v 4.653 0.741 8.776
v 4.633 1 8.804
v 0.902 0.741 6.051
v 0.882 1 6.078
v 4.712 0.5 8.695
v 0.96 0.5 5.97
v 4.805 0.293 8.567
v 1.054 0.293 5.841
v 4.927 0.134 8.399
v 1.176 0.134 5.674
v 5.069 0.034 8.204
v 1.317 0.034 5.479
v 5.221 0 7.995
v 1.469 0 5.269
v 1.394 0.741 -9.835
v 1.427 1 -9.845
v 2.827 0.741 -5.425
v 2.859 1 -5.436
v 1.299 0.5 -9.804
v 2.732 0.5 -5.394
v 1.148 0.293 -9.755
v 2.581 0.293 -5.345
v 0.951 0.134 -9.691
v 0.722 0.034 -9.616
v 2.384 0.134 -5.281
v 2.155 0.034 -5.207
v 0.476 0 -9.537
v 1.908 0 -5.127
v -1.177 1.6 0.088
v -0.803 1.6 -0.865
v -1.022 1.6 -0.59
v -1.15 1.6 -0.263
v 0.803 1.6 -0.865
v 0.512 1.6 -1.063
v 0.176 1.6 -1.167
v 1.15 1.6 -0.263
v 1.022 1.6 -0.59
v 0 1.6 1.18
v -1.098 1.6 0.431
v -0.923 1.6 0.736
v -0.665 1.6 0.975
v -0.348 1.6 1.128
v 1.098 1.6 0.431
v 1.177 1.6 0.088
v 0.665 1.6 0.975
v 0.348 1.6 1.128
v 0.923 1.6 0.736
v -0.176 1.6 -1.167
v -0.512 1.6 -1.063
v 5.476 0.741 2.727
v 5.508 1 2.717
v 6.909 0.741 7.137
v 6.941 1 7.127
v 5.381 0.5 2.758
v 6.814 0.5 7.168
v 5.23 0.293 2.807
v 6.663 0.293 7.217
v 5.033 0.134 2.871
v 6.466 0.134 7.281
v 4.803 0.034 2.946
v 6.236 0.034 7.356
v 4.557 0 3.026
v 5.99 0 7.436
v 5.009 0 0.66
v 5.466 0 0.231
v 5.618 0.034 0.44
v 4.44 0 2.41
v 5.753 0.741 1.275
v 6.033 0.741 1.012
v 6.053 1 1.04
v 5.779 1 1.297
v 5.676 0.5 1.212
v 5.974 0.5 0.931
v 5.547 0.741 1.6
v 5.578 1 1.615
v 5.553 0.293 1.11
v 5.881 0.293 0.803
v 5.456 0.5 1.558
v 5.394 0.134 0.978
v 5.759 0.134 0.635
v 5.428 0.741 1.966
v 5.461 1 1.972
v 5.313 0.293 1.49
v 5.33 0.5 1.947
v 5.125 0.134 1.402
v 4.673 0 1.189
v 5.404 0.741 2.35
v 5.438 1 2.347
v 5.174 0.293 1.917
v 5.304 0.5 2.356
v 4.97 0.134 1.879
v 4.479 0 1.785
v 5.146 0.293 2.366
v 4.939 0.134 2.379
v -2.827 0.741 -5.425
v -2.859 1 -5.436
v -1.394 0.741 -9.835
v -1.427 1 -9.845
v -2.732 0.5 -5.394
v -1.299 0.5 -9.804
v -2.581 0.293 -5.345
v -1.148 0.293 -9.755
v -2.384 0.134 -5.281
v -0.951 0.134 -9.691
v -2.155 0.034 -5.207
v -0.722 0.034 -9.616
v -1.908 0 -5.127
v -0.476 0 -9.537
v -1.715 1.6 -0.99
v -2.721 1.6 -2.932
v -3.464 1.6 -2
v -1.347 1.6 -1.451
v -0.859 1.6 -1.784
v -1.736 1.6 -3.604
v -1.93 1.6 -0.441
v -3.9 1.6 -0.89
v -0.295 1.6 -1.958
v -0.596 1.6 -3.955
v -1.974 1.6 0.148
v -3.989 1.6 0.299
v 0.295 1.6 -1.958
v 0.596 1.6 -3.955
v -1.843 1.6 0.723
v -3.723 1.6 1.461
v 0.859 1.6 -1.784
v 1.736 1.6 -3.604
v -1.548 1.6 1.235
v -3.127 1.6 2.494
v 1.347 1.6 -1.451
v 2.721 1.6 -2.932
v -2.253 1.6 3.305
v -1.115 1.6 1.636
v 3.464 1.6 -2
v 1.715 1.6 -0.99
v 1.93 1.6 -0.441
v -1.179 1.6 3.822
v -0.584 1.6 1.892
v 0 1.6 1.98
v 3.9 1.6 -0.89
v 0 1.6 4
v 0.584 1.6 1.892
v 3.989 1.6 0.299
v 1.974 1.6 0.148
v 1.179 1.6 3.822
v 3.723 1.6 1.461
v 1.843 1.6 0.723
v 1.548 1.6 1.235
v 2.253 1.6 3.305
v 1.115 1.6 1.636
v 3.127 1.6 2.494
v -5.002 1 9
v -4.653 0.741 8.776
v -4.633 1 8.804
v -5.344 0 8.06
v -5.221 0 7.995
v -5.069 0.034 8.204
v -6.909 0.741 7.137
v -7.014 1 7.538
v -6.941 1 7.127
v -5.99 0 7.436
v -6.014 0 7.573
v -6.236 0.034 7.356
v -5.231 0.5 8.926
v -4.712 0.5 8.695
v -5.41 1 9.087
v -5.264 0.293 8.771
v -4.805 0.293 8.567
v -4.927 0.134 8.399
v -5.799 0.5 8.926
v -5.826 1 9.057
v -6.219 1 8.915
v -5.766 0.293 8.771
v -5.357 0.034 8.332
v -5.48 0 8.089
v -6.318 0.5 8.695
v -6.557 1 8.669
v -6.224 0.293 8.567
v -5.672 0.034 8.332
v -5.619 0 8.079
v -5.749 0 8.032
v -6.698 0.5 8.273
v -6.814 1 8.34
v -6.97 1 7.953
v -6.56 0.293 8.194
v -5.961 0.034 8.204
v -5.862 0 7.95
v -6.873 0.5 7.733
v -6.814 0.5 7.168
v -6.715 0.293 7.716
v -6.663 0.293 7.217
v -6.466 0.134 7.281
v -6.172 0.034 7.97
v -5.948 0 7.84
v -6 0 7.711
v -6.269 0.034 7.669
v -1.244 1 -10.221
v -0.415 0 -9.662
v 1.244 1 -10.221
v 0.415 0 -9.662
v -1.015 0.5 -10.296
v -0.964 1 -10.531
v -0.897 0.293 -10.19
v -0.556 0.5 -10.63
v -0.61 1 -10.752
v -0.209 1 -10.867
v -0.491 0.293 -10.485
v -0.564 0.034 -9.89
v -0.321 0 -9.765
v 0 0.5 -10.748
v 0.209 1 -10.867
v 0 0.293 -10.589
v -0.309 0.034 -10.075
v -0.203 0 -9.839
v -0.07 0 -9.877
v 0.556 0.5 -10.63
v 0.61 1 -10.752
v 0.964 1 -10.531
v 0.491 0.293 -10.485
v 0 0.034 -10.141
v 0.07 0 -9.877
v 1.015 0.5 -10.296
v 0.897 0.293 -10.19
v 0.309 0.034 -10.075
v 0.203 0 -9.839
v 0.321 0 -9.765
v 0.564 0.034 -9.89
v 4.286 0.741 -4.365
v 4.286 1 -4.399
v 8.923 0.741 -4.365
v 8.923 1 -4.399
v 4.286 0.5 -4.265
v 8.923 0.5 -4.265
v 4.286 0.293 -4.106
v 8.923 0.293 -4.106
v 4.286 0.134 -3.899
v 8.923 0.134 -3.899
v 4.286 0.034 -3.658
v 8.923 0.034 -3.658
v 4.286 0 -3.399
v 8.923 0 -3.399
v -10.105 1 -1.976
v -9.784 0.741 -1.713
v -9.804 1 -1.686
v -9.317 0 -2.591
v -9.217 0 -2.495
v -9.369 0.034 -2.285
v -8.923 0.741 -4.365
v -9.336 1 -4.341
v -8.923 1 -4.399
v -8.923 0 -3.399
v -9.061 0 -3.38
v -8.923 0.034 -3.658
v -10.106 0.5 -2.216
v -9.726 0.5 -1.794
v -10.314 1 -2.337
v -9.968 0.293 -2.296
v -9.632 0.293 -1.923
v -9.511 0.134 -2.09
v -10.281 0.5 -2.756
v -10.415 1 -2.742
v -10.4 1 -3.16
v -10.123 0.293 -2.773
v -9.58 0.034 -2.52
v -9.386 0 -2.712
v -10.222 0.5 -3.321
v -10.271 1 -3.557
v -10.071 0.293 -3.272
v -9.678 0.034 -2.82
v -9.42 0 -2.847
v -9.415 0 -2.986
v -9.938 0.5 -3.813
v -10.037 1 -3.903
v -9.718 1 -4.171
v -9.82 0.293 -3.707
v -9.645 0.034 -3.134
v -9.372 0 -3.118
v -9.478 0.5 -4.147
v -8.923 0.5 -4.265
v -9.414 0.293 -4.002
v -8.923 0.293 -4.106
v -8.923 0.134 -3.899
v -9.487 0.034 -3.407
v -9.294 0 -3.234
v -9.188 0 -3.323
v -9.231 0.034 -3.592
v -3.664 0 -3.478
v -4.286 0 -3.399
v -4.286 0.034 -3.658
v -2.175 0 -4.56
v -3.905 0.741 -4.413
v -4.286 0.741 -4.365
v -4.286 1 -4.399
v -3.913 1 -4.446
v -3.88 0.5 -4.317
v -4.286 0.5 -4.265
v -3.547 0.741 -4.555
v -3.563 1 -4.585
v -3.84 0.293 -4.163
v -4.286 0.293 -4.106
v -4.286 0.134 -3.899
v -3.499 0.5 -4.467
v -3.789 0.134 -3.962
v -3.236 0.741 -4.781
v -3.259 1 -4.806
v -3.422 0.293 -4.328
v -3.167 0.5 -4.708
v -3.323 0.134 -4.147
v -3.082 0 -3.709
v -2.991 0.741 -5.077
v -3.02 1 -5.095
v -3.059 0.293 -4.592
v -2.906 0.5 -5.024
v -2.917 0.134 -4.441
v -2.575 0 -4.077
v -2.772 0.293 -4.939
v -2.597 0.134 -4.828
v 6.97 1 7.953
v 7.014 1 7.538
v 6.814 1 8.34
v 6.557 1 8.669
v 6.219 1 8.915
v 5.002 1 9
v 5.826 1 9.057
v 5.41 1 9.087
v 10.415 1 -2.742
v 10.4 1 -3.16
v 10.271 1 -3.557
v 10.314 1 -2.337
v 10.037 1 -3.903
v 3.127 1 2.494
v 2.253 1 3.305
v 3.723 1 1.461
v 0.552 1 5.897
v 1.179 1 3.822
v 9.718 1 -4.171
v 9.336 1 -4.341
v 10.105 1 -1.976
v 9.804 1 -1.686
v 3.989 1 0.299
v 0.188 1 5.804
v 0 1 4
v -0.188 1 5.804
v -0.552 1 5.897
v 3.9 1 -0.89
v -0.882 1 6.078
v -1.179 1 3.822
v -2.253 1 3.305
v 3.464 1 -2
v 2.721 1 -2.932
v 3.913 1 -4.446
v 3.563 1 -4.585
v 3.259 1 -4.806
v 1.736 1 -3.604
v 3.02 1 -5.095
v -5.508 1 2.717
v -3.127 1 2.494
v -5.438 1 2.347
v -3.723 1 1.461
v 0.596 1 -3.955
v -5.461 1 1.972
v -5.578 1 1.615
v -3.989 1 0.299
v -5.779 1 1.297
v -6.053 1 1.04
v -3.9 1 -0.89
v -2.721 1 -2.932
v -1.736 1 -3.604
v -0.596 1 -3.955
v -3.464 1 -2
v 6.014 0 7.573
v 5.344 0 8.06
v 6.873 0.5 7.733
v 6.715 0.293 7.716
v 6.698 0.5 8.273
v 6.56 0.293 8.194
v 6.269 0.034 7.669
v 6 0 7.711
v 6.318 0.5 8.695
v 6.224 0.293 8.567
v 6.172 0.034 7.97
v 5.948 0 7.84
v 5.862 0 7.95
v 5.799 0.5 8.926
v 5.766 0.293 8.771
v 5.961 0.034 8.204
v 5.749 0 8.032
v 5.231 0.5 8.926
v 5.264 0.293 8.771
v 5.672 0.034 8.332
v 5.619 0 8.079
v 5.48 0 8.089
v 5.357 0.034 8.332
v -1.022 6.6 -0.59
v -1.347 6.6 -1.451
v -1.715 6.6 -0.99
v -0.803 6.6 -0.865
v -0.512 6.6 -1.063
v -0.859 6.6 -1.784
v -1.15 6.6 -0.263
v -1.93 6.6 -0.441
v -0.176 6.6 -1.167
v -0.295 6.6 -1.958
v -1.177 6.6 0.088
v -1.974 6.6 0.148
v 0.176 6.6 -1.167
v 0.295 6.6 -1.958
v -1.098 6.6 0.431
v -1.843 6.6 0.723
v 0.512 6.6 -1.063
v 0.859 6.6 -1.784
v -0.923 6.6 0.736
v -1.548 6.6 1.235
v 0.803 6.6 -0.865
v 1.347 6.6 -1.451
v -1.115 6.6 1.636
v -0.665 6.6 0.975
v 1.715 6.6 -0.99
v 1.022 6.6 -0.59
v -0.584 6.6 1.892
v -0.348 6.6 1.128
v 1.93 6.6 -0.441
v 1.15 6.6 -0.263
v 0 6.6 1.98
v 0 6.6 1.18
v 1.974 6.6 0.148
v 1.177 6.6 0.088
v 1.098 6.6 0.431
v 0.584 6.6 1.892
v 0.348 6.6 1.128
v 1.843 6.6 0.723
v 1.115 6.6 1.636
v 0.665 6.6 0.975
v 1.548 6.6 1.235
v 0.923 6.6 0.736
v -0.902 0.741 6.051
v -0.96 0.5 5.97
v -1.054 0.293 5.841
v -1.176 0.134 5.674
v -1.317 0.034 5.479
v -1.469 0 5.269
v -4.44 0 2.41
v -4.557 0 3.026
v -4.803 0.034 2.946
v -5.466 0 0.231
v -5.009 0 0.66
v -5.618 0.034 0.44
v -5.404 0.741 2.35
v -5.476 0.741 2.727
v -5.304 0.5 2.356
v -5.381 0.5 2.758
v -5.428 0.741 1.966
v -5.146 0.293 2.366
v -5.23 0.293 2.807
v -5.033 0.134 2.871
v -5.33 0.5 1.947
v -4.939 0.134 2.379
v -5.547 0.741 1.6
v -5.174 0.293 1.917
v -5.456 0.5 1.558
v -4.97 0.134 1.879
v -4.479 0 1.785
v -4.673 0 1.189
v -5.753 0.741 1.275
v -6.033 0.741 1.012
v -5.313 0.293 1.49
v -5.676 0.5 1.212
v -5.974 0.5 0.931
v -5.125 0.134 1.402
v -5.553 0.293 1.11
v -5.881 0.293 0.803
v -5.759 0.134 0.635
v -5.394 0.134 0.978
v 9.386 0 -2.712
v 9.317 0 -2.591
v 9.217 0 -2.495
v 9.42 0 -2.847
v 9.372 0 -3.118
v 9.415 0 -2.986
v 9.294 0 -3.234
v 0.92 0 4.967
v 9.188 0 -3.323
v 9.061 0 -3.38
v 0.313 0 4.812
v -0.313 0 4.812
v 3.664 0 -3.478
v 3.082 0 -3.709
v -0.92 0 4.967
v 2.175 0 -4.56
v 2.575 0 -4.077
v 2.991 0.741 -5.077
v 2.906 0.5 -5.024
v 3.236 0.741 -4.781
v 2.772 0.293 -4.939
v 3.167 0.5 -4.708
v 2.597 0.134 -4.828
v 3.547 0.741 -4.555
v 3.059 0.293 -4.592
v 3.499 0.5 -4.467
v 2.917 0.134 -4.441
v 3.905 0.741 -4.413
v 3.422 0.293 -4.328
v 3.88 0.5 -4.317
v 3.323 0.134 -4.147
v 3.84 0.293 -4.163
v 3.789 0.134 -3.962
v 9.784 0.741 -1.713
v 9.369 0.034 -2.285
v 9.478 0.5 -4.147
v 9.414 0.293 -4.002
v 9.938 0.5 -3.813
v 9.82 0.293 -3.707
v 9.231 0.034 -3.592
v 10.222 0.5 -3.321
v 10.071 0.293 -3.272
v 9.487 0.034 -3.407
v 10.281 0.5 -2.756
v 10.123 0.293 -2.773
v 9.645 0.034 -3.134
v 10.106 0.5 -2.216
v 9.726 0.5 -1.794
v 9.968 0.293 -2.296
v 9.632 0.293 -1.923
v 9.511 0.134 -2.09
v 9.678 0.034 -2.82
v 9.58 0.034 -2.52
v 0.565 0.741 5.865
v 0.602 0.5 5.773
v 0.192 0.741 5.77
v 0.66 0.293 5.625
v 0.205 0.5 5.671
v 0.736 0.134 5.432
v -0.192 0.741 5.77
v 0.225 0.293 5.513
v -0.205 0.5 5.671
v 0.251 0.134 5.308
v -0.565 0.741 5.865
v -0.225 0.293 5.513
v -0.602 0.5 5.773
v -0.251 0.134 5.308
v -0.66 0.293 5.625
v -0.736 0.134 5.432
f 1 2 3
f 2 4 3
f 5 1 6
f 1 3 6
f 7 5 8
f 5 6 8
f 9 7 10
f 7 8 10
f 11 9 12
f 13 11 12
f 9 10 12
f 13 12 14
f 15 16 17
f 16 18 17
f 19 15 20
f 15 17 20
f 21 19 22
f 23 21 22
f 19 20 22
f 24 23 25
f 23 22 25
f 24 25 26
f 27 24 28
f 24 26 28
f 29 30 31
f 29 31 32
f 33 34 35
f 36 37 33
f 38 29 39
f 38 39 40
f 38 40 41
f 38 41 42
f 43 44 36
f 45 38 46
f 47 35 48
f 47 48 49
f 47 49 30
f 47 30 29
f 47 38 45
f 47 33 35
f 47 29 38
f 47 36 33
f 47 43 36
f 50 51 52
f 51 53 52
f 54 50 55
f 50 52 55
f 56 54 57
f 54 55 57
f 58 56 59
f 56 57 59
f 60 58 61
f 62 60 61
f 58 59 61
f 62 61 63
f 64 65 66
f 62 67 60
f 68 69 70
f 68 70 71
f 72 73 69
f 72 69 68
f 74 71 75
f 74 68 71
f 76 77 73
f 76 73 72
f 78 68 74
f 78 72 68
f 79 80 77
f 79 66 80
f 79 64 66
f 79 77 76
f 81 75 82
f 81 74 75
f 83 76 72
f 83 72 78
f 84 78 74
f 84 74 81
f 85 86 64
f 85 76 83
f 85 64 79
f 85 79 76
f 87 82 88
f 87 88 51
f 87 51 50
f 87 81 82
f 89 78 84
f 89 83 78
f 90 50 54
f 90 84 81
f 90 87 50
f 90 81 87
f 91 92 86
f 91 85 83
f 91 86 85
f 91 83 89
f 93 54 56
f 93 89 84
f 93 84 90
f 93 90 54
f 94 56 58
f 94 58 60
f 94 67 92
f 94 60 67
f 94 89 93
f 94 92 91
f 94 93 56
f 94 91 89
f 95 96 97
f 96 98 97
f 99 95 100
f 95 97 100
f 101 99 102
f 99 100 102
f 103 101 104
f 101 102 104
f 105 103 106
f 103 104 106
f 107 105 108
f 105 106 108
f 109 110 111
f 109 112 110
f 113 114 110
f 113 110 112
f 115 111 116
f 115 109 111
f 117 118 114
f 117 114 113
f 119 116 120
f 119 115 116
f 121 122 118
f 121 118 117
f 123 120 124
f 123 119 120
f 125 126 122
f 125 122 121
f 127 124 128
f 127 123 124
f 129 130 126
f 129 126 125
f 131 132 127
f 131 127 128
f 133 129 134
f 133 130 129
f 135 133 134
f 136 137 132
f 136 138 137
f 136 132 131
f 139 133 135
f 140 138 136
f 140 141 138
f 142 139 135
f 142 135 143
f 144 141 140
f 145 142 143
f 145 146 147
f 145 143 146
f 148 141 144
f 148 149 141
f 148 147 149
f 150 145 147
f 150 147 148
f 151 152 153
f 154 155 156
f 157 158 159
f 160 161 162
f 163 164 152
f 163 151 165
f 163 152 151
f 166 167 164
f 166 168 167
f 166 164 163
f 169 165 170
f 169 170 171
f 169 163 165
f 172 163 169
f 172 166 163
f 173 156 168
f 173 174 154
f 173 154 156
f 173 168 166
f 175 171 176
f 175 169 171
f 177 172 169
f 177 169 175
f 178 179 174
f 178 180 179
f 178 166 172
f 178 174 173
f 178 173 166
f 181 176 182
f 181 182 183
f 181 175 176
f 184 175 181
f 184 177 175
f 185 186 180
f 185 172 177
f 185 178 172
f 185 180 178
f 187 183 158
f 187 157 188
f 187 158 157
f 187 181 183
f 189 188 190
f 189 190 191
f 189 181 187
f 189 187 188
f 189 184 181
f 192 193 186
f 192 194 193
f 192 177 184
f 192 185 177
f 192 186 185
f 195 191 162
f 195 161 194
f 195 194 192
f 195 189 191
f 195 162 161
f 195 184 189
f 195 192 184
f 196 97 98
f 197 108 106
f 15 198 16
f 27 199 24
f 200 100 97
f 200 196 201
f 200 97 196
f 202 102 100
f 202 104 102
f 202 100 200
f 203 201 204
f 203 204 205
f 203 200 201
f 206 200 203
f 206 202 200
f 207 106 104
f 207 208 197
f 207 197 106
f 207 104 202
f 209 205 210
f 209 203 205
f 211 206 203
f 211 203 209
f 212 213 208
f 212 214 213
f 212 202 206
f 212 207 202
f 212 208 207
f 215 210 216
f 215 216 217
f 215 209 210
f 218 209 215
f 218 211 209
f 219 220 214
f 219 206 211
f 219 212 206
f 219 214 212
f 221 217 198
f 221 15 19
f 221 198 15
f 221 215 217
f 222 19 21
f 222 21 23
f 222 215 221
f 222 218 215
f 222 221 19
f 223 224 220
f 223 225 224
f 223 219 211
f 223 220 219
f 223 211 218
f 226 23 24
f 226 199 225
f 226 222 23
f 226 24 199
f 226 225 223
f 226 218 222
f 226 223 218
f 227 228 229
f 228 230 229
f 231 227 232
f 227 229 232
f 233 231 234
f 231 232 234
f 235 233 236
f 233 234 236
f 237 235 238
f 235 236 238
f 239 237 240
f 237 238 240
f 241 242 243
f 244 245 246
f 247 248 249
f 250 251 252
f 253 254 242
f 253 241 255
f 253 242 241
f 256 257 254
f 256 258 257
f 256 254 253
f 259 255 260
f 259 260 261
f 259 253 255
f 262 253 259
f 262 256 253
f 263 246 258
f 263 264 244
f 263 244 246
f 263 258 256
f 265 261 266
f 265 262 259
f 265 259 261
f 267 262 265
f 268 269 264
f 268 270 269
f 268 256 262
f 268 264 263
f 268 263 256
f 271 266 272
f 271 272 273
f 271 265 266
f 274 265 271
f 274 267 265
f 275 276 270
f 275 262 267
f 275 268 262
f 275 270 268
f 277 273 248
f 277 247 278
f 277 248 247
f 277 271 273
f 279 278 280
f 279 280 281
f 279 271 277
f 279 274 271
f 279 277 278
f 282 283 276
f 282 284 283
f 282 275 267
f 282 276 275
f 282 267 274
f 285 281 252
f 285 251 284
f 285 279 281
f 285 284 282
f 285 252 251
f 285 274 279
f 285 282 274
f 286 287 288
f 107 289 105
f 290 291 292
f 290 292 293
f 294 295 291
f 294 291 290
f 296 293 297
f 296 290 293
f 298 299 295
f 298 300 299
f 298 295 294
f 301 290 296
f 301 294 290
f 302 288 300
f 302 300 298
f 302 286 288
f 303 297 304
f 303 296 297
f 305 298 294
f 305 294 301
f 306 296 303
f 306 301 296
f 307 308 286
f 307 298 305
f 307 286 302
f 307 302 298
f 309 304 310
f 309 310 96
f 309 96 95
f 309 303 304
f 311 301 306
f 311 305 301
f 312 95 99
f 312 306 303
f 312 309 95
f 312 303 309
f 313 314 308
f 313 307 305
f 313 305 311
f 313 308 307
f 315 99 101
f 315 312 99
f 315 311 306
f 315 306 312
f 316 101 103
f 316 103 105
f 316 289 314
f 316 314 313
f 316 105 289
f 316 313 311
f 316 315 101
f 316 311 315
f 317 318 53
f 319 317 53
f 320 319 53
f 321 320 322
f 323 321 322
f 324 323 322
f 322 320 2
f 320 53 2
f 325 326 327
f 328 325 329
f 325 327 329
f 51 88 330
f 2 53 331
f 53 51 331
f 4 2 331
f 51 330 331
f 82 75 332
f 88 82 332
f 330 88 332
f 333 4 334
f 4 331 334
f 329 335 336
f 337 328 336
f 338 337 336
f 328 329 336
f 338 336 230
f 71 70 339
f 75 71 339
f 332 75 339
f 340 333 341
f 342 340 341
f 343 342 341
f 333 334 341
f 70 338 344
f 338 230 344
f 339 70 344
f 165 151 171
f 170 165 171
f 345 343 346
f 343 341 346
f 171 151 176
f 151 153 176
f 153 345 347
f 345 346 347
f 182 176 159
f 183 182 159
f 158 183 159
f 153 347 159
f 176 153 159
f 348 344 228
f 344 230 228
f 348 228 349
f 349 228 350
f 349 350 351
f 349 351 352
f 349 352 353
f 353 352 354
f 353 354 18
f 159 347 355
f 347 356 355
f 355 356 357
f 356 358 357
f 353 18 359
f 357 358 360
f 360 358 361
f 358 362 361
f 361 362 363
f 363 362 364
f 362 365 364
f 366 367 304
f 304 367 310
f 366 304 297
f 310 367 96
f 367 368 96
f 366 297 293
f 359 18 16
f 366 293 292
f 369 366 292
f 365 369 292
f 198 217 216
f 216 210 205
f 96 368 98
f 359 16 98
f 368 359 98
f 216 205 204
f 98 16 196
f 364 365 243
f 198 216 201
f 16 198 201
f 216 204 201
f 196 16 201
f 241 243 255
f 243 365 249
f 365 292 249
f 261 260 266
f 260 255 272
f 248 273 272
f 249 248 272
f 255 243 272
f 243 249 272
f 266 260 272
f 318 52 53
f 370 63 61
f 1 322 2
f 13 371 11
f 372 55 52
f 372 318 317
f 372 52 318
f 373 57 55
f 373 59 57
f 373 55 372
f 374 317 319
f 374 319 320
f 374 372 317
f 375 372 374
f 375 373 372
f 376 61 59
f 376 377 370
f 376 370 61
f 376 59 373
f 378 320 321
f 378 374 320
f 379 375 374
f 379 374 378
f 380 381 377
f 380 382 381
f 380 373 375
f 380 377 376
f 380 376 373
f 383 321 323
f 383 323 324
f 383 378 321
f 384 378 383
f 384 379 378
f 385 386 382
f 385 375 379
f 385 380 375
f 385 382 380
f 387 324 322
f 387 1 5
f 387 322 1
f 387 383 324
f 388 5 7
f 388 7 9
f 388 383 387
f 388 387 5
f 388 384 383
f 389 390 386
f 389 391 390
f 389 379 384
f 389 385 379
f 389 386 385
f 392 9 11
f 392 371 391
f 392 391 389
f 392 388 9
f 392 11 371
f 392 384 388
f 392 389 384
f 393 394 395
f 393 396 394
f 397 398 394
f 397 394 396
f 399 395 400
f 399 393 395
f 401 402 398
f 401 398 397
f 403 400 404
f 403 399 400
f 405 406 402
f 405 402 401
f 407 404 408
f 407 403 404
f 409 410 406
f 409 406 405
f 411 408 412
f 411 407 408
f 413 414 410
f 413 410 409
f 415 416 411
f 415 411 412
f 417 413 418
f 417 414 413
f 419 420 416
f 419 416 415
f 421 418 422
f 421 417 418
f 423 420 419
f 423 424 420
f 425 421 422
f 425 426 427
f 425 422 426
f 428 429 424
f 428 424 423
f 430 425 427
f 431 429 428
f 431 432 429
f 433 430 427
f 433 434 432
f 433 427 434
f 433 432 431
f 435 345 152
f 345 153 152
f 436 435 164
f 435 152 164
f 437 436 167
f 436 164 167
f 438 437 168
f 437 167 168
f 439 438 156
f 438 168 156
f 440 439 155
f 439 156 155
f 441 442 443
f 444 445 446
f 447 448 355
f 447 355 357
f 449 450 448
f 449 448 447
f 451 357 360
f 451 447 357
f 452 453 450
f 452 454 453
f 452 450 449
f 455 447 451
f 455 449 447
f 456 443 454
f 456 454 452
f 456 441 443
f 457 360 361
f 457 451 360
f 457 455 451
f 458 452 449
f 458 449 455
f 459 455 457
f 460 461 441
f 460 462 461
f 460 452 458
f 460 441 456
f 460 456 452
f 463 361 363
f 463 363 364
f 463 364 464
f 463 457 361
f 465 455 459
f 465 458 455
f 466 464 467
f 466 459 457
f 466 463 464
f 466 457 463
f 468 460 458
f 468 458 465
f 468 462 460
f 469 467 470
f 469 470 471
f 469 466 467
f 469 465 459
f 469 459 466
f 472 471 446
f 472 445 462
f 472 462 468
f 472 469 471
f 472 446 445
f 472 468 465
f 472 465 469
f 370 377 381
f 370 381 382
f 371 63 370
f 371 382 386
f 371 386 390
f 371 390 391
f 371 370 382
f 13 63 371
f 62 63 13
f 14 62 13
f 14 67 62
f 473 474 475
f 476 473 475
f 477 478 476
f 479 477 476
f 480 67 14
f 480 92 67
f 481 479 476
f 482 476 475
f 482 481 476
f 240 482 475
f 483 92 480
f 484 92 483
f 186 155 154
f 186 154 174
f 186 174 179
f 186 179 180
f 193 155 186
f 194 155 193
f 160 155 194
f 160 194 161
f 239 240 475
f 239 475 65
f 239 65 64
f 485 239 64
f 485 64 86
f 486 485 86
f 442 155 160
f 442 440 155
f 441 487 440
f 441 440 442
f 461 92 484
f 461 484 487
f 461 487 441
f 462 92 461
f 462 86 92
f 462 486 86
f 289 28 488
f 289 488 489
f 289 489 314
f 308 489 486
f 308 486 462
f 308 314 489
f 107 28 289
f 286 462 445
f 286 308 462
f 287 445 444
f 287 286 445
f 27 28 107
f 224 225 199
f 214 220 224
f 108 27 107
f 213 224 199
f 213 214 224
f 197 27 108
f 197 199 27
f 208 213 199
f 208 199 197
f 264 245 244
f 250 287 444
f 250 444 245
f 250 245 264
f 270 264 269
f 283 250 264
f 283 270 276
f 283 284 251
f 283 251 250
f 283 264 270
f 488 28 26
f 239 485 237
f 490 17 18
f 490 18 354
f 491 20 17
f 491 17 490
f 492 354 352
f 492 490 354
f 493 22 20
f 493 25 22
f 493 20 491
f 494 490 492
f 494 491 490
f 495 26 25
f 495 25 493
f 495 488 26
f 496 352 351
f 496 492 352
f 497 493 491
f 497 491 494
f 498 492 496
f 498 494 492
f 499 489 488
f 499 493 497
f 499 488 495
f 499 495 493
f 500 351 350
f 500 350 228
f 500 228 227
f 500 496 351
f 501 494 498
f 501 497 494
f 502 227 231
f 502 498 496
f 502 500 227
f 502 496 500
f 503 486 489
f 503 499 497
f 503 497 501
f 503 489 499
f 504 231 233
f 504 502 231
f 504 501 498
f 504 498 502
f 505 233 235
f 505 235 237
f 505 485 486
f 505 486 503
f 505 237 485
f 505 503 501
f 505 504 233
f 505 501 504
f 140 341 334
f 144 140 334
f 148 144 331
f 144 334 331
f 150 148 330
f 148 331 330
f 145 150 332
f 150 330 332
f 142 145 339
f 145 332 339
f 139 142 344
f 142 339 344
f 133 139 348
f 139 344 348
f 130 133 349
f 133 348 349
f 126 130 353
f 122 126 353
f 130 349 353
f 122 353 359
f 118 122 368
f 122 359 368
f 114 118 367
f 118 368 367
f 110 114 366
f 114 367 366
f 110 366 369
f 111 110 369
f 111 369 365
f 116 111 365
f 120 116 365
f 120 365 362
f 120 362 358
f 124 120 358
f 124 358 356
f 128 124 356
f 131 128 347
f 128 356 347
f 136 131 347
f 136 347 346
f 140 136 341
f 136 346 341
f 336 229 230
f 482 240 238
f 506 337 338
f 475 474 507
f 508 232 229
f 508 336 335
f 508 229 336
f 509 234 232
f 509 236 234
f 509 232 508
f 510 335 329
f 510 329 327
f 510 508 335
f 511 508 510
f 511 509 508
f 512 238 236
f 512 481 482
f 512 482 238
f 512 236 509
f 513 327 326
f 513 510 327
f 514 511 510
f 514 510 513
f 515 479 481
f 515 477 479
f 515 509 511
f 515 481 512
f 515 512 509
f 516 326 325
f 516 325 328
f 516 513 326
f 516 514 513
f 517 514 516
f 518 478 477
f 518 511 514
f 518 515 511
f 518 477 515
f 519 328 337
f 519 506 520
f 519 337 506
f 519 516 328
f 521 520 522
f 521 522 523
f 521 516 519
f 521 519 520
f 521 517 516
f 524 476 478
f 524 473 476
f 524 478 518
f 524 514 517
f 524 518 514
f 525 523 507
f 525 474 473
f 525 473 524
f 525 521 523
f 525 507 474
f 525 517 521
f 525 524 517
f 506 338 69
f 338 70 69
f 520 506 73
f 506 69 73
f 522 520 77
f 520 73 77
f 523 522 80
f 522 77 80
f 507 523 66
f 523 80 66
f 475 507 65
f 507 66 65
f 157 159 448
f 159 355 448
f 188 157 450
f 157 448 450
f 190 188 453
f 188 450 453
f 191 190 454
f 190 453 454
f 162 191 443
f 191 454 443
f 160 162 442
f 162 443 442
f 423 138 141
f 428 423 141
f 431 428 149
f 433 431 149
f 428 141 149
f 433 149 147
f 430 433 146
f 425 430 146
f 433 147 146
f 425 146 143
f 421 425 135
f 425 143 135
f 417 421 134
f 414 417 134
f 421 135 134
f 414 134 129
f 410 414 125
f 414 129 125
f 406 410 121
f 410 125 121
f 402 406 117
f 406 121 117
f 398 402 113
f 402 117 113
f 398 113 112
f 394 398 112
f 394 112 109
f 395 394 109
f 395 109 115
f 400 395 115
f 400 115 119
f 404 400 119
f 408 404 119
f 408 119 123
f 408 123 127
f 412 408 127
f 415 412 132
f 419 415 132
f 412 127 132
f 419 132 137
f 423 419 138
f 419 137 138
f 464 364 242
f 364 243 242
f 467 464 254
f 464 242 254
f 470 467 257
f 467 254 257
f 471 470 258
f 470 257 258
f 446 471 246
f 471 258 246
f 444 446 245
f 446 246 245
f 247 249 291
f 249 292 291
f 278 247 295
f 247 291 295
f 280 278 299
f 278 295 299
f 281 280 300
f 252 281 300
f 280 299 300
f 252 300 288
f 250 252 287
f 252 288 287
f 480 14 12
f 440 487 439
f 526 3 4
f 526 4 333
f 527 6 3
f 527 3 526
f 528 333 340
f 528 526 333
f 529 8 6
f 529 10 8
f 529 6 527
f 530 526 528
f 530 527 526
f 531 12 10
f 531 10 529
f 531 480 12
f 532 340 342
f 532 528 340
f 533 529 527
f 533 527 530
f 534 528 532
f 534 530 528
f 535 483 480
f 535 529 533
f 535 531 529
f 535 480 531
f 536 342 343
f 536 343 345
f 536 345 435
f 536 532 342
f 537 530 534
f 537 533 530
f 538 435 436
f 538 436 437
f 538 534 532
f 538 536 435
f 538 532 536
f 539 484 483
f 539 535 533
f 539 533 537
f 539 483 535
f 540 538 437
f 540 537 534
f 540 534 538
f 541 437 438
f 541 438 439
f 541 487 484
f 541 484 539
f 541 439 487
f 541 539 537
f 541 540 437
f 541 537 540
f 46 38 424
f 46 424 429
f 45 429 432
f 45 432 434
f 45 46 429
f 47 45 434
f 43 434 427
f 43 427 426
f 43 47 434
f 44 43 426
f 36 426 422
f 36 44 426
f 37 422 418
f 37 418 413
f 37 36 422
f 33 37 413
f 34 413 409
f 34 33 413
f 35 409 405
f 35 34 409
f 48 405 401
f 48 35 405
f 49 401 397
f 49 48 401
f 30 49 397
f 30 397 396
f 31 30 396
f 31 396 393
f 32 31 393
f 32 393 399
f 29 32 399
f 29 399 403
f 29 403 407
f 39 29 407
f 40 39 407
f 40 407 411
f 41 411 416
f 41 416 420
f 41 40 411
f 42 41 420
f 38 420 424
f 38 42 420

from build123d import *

# Parameters (mm, degrees)
SALIENTE_EXTRUIR1_DEPTH = 1
REDONDEO1_R             = 1
CROQUIS5_R              = 4
SALIENTE_EXTRUIR5_DEPTH = 0.6
CROQUIS2_R              = 1.98
CROQUIS2_R_2            = 1.18
SALIENTE_EXTRUIR2_DEPTH = 5


with BuildPart() as part:
    # Croquis1 → Saliente-Extruir1 (new body)
    with BuildSketch(Plane(origin=(0, 0, 0), x_dir=(1, 0, 0), z_dir=(0, 1, 0))):
        with BuildLine():
            Line((1.426584774, 9.845491503), (2.859425417, 5.435661447))
            ThreePointArc((2.859425417, 5.435661447), (3.404332313, 4.685661447), (4.286010191, 4.399186938))
            Line((4.286010191, 4.399186938), (8.922779911, 4.399186938))
            ThreePointArc((8.922779911, 4.399186938), (10.349364685, 3.36271243), (9.804457789, 1.685661447))
            Line((9.804457789, 1.685661447), (6.053232287, -1.039763413))
            ThreePointArc((6.053232287, -1.039763413), (5.508325391, -1.789763413), (5.508325391, -2.716814396))
            Line((5.508325391, -2.716814396), (6.941166033, -7.126644452))
            ThreePointArc((6.941166033, -7.126644452), (6.396259137, -8.803695435), (4.63290338, -8.803695435))
            Line((4.63290338, -8.803695435), (0.881677878, -6.078270576))
            ThreePointArc((0.881677878, -6.078270576), (0, -5.791796068), (-0.881677878, -6.078270576))
            Line((-0.881677878, -6.078270576), (-4.63290338, -8.803695435))
            ThreePointArc((-4.63290338, -8.803695435), (-6.396259137, -8.803695435), (-6.941166033, -7.126644452))
            Line((-6.941166033, -7.126644452), (-5.508325391, -2.716814396))
            ThreePointArc((-5.508325391, -2.716814396), (-5.508325391, -1.789763413), (-6.053232287, -1.039763413))
            Line((-6.053232287, -1.039763413), (-9.804457789, 1.685661447))
            ThreePointArc((-9.804457789, 1.685661447), (-10.349364685, 3.36271243), (-8.922779911, 4.399186938))
            Line((-8.922779911, 4.399186938), (-4.286010191, 4.399186938))
            ThreePointArc((-4.286010191, 4.399186938), (-3.404332313, 4.685661447), (-2.859425417, 5.435661447))
            Line((-2.859425417, 5.435661447), (-1.426584774, 9.845491503))
            ThreePointArc((-1.426584774, 9.845491503), (0, 10.881966011), (1.426584774, 9.845491503))
        make_face()
    extrude(amount=SALIENTE_EXTRUIR1_DEPTH)

    # Redondeo1
    redondeo1_edges = [part.edges().sort_by_distance(p)[0] for p in [
        (-6.224745712, 0, 4.921729424),
        (-6.396259137, 0, 8.803695435),
        (-2.757290629, 0, 7.440983006),
        (0, 0, 5.791796068),
        (2.757290629, 0, 7.440983006),
        (6.396259137, 0, 8.803695435),
        (6.224745712, 0, 4.921729424),
        (5.508325391, 0, 1.789763413),
        (7.928845038, 0, -0.322949017),
        (10.349364685, 0, -3.36271243),
        (6.604395051, 0, -4.399186938),
        (3.404332313, 0, -4.685661447),
        (2.143005096, 0, -7.640576475),
        (0, 0, -10.881966011),
        (-2.143005096, 0, -7.640576475),
        (-3.404332313, 0, -4.685661447),
        (-6.604395051, 0, -4.399186938),
        (-10.349364685, 0, -3.36271243),
        (-7.928845038, 0, -0.322949017),
        (-5.508325391, 0, 1.789763413),
    ]]
    fillet(redondeo1_edges, radius=REDONDEO1_R - 0.0001)  # a hair under: the kernel refuses the full size

    # Croquis5 → Saliente-Extruir5 (add)
    with BuildSketch(Plane(origin=(0, 1, 0), x_dir=(1, 0, 0), z_dir=(0, 1, 0))):
        with Locations(Location((0, 0, 0), (0, 0, 270))):
            Circle(CROQUIS5_R)
    extrude(amount=SALIENTE_EXTRUIR5_DEPTH)

    # Croquis2 → Saliente-Extruir2 (add)
    with BuildSketch(Plane(origin=(0, 1.6, 0), x_dir=(1, 0, 0), z_dir=(0, 1, 0))):
        with Locations(Location((0, 0, 0), (0, 0, 270))):
            Circle(CROQUIS2_R)
        with Locations(Location((0, 0, 0), (0, 0, 270))):
            Circle(CROQUIS2_R_2, mode=Mode.SUBTRACT)
    extrude(amount=SALIENTE_EXTRUIR2_DEPTH)


solid = part.part
